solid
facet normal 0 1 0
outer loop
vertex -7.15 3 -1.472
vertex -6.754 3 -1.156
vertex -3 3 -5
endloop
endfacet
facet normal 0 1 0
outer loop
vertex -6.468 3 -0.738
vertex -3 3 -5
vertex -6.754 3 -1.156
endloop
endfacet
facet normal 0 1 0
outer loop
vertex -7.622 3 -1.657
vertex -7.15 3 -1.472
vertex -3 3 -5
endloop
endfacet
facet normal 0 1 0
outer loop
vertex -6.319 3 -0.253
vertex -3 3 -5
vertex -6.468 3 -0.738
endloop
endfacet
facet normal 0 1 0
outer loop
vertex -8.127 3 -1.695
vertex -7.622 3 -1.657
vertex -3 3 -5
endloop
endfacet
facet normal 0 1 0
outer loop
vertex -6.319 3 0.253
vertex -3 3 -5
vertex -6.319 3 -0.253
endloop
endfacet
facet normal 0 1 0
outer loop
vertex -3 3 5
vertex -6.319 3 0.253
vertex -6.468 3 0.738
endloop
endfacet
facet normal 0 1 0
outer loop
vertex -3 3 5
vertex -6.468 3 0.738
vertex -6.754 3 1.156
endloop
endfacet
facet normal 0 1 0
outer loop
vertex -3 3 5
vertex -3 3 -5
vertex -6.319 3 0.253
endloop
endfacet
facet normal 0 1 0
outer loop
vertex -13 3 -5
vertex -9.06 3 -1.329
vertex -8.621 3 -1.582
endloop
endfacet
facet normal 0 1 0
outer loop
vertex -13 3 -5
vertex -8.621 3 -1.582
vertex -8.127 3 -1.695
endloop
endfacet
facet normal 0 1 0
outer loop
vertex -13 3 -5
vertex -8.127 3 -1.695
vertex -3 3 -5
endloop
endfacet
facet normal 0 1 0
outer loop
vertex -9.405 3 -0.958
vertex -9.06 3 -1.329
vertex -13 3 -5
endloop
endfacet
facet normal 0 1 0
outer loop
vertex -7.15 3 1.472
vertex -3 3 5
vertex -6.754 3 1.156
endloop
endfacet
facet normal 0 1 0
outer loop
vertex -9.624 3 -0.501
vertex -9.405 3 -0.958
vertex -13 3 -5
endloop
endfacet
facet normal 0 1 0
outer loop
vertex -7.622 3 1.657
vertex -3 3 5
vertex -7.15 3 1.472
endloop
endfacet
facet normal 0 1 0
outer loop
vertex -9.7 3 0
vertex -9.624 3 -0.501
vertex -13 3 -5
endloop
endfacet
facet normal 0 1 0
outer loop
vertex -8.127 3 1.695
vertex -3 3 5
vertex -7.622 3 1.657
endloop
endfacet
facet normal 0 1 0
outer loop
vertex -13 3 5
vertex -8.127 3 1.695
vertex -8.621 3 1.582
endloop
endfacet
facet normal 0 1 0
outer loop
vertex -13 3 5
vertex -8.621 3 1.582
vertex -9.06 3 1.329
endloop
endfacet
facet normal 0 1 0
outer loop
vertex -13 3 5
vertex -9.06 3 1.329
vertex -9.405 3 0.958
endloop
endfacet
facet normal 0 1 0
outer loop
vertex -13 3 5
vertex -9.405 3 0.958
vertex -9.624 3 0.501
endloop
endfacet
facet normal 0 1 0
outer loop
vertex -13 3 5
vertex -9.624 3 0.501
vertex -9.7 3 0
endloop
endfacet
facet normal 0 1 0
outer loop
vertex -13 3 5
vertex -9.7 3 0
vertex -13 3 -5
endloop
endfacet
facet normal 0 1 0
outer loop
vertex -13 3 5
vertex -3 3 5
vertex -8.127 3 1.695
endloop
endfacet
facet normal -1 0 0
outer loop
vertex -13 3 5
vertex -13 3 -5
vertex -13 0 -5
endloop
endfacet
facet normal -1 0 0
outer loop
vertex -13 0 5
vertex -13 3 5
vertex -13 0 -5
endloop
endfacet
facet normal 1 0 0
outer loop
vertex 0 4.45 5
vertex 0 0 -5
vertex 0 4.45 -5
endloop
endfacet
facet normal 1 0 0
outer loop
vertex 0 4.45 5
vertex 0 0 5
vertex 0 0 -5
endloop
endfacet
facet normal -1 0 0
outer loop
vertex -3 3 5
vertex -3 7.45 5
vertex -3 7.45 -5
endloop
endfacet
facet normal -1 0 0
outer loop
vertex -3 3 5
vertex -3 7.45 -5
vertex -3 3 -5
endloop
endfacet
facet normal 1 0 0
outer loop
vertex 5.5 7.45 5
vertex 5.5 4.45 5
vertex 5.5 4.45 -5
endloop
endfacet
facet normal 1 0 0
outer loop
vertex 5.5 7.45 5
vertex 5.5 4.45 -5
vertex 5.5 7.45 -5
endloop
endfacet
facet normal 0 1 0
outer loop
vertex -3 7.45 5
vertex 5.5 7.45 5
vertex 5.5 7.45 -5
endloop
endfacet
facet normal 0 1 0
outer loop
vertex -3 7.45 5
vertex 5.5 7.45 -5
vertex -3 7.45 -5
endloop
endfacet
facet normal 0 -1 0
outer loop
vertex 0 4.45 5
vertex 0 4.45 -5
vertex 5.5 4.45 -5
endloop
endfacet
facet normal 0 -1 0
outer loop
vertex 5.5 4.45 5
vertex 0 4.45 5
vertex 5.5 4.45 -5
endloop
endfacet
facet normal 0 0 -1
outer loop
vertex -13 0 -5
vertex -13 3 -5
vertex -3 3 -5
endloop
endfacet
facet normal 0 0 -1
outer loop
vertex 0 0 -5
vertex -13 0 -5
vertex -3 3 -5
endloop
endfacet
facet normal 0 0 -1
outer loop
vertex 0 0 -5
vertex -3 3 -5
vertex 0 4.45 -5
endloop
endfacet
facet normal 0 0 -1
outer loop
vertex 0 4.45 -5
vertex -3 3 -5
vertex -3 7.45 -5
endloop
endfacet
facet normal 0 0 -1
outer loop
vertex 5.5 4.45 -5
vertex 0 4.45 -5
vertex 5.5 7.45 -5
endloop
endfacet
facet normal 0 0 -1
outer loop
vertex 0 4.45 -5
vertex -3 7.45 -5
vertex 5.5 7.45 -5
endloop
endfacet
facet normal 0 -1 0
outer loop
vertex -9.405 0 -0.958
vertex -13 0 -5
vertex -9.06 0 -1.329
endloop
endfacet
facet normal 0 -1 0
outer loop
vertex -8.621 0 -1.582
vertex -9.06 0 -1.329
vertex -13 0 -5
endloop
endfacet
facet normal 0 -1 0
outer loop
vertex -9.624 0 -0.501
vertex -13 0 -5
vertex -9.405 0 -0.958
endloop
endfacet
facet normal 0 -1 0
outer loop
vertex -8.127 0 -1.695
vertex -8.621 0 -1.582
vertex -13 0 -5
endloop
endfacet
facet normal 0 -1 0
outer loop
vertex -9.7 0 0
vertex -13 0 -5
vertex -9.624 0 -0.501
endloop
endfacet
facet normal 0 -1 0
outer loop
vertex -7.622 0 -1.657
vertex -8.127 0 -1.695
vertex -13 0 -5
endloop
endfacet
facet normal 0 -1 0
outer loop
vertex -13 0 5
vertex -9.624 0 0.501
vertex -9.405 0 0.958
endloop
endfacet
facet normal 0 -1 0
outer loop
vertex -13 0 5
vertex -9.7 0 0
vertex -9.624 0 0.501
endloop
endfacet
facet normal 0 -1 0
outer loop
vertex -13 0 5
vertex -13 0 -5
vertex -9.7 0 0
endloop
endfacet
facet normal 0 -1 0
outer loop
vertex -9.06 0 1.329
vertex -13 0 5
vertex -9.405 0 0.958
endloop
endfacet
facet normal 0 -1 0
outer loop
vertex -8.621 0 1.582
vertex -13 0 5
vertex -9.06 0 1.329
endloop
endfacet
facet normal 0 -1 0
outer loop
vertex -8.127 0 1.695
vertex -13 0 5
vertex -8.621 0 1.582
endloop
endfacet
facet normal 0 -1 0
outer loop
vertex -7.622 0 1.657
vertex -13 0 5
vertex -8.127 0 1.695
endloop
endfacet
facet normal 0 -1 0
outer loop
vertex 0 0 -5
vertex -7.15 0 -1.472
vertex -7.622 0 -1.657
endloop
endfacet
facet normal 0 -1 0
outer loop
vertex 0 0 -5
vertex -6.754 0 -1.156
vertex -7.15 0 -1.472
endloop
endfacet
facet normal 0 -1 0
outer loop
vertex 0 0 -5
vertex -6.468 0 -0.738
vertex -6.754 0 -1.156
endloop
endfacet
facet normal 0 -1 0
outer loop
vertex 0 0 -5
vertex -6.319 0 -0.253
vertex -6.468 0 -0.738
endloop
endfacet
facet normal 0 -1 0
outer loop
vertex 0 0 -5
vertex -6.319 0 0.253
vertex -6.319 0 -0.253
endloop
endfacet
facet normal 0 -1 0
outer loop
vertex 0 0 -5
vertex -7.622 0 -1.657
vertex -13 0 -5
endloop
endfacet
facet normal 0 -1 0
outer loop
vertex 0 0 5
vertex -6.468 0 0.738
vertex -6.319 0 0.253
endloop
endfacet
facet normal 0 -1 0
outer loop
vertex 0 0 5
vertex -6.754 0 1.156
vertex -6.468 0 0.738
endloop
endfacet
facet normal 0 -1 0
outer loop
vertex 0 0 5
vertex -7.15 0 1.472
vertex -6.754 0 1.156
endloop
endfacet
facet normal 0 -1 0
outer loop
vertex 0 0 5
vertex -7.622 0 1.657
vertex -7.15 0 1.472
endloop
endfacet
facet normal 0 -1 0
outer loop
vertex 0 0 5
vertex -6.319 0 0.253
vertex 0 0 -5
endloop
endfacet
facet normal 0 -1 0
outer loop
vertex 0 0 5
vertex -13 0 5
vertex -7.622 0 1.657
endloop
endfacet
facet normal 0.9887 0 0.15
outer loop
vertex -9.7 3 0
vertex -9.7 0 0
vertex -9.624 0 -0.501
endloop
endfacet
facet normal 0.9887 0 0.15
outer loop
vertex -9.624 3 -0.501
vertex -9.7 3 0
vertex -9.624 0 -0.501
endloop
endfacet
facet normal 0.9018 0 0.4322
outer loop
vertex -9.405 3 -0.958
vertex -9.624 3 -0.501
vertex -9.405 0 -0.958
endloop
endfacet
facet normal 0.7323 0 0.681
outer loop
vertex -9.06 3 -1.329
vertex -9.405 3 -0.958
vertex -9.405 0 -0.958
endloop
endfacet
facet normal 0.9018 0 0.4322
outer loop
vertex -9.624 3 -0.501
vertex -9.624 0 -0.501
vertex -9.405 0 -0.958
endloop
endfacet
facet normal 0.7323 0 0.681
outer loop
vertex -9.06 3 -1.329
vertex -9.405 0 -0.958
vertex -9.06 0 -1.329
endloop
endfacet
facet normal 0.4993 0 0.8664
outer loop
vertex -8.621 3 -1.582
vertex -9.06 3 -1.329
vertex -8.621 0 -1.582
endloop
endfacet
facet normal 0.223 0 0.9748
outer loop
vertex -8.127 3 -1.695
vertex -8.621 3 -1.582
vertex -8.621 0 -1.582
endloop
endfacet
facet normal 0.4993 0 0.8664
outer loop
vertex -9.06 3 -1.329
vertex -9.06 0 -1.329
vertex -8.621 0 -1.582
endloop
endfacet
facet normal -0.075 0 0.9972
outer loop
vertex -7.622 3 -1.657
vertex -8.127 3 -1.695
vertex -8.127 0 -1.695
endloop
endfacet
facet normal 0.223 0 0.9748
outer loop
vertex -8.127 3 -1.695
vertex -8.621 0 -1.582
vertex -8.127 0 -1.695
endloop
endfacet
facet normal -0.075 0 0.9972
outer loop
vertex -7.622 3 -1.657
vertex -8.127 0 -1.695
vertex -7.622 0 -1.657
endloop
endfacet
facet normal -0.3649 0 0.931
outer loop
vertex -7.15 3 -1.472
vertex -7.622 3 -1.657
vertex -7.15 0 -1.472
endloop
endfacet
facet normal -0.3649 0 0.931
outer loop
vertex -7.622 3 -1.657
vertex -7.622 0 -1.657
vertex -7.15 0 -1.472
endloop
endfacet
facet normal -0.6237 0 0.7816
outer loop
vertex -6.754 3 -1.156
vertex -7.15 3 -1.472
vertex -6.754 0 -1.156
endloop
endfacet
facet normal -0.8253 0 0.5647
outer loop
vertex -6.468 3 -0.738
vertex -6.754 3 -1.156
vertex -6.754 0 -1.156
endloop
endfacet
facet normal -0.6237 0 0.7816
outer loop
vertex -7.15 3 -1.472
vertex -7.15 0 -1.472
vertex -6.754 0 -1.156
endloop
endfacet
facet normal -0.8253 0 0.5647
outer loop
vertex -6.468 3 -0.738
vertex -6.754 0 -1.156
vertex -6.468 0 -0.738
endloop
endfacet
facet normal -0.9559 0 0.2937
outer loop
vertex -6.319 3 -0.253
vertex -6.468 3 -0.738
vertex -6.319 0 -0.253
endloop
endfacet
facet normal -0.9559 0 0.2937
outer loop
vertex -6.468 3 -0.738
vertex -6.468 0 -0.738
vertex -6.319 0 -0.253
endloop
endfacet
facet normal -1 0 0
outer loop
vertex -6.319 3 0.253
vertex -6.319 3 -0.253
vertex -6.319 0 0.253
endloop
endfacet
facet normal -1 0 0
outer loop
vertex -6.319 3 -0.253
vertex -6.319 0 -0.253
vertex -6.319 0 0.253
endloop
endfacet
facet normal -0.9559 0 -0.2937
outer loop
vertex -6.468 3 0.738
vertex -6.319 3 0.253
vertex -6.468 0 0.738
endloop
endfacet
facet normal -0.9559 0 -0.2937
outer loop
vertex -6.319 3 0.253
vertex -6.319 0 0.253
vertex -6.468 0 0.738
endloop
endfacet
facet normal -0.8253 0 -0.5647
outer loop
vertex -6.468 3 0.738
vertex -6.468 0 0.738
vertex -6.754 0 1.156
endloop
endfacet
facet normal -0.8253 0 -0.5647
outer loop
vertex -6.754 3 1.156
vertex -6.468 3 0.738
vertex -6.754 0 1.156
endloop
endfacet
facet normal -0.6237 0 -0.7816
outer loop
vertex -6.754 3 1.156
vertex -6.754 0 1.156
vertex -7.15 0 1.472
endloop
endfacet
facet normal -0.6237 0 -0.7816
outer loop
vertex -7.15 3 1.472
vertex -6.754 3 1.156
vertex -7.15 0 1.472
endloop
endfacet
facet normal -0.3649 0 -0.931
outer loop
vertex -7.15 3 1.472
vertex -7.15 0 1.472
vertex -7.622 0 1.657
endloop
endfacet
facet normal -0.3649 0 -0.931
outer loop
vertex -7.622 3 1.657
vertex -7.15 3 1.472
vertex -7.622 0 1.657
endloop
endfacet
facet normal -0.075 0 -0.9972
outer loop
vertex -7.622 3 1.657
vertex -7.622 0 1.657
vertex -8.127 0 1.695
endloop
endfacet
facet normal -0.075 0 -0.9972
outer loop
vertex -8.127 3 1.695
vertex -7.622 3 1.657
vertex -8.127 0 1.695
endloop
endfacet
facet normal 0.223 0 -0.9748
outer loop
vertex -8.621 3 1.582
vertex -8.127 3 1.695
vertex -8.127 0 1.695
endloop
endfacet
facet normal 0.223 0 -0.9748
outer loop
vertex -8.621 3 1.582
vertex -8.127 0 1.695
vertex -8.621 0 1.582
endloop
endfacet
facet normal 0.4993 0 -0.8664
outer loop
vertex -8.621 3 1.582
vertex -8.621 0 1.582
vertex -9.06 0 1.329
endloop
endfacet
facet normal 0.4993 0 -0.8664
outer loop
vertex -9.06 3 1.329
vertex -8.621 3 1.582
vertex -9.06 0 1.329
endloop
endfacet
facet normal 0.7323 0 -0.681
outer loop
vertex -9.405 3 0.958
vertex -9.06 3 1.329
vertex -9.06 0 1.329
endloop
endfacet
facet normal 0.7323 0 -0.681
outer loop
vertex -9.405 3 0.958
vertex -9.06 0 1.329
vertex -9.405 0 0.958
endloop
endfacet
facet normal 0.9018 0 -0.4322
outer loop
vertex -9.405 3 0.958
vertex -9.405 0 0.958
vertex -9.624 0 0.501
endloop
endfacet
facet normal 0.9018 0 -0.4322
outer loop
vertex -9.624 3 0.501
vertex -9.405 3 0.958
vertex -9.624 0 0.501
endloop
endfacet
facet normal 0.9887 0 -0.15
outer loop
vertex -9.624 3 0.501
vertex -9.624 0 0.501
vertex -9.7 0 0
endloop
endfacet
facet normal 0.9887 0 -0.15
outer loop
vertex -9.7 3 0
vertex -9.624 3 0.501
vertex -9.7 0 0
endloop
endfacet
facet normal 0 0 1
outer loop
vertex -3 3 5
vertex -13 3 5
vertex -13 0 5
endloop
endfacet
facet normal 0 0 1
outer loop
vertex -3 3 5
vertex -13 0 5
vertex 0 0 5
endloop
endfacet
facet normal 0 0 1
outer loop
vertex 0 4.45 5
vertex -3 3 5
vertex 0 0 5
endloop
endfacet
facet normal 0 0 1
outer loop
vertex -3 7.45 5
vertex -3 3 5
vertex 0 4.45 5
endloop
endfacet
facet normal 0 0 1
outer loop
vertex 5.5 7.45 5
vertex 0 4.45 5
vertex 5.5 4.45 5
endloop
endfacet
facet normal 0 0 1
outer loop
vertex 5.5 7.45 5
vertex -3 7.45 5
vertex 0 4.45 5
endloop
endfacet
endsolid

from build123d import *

# Parameters (mm, degrees)
BOSS_EXTRUDE1_DEPTH  = 5
M3_CLEARANCE_HOLE1_D = 3.4


with BuildPart() as part:
    # Sketch1 → Boss-Extrude1 (new, symmetric)
    with BuildSketch(Plane.XY):
        Polygon((0, 0), (0, 4.45), (5.5, 4.45), (5.5, 7.45), (-3, 7.45), (-3, 3), (-13, 3), (-13, 0), (-3, 0), align=None)
    extrude(amount=BOSS_EXTRUDE1_DEPTH, both=True)

    # M3 Clearance Hole1 (through all)
    with Locations(Plane(origin=(0, 3, 0), x_dir=(1, 0, 0), z_dir=(0, 1, 0))):
        with Locations((-8, 0)):
            Hole(M3_CLEARANCE_HOLE1_D / 2)


solid = part.part
